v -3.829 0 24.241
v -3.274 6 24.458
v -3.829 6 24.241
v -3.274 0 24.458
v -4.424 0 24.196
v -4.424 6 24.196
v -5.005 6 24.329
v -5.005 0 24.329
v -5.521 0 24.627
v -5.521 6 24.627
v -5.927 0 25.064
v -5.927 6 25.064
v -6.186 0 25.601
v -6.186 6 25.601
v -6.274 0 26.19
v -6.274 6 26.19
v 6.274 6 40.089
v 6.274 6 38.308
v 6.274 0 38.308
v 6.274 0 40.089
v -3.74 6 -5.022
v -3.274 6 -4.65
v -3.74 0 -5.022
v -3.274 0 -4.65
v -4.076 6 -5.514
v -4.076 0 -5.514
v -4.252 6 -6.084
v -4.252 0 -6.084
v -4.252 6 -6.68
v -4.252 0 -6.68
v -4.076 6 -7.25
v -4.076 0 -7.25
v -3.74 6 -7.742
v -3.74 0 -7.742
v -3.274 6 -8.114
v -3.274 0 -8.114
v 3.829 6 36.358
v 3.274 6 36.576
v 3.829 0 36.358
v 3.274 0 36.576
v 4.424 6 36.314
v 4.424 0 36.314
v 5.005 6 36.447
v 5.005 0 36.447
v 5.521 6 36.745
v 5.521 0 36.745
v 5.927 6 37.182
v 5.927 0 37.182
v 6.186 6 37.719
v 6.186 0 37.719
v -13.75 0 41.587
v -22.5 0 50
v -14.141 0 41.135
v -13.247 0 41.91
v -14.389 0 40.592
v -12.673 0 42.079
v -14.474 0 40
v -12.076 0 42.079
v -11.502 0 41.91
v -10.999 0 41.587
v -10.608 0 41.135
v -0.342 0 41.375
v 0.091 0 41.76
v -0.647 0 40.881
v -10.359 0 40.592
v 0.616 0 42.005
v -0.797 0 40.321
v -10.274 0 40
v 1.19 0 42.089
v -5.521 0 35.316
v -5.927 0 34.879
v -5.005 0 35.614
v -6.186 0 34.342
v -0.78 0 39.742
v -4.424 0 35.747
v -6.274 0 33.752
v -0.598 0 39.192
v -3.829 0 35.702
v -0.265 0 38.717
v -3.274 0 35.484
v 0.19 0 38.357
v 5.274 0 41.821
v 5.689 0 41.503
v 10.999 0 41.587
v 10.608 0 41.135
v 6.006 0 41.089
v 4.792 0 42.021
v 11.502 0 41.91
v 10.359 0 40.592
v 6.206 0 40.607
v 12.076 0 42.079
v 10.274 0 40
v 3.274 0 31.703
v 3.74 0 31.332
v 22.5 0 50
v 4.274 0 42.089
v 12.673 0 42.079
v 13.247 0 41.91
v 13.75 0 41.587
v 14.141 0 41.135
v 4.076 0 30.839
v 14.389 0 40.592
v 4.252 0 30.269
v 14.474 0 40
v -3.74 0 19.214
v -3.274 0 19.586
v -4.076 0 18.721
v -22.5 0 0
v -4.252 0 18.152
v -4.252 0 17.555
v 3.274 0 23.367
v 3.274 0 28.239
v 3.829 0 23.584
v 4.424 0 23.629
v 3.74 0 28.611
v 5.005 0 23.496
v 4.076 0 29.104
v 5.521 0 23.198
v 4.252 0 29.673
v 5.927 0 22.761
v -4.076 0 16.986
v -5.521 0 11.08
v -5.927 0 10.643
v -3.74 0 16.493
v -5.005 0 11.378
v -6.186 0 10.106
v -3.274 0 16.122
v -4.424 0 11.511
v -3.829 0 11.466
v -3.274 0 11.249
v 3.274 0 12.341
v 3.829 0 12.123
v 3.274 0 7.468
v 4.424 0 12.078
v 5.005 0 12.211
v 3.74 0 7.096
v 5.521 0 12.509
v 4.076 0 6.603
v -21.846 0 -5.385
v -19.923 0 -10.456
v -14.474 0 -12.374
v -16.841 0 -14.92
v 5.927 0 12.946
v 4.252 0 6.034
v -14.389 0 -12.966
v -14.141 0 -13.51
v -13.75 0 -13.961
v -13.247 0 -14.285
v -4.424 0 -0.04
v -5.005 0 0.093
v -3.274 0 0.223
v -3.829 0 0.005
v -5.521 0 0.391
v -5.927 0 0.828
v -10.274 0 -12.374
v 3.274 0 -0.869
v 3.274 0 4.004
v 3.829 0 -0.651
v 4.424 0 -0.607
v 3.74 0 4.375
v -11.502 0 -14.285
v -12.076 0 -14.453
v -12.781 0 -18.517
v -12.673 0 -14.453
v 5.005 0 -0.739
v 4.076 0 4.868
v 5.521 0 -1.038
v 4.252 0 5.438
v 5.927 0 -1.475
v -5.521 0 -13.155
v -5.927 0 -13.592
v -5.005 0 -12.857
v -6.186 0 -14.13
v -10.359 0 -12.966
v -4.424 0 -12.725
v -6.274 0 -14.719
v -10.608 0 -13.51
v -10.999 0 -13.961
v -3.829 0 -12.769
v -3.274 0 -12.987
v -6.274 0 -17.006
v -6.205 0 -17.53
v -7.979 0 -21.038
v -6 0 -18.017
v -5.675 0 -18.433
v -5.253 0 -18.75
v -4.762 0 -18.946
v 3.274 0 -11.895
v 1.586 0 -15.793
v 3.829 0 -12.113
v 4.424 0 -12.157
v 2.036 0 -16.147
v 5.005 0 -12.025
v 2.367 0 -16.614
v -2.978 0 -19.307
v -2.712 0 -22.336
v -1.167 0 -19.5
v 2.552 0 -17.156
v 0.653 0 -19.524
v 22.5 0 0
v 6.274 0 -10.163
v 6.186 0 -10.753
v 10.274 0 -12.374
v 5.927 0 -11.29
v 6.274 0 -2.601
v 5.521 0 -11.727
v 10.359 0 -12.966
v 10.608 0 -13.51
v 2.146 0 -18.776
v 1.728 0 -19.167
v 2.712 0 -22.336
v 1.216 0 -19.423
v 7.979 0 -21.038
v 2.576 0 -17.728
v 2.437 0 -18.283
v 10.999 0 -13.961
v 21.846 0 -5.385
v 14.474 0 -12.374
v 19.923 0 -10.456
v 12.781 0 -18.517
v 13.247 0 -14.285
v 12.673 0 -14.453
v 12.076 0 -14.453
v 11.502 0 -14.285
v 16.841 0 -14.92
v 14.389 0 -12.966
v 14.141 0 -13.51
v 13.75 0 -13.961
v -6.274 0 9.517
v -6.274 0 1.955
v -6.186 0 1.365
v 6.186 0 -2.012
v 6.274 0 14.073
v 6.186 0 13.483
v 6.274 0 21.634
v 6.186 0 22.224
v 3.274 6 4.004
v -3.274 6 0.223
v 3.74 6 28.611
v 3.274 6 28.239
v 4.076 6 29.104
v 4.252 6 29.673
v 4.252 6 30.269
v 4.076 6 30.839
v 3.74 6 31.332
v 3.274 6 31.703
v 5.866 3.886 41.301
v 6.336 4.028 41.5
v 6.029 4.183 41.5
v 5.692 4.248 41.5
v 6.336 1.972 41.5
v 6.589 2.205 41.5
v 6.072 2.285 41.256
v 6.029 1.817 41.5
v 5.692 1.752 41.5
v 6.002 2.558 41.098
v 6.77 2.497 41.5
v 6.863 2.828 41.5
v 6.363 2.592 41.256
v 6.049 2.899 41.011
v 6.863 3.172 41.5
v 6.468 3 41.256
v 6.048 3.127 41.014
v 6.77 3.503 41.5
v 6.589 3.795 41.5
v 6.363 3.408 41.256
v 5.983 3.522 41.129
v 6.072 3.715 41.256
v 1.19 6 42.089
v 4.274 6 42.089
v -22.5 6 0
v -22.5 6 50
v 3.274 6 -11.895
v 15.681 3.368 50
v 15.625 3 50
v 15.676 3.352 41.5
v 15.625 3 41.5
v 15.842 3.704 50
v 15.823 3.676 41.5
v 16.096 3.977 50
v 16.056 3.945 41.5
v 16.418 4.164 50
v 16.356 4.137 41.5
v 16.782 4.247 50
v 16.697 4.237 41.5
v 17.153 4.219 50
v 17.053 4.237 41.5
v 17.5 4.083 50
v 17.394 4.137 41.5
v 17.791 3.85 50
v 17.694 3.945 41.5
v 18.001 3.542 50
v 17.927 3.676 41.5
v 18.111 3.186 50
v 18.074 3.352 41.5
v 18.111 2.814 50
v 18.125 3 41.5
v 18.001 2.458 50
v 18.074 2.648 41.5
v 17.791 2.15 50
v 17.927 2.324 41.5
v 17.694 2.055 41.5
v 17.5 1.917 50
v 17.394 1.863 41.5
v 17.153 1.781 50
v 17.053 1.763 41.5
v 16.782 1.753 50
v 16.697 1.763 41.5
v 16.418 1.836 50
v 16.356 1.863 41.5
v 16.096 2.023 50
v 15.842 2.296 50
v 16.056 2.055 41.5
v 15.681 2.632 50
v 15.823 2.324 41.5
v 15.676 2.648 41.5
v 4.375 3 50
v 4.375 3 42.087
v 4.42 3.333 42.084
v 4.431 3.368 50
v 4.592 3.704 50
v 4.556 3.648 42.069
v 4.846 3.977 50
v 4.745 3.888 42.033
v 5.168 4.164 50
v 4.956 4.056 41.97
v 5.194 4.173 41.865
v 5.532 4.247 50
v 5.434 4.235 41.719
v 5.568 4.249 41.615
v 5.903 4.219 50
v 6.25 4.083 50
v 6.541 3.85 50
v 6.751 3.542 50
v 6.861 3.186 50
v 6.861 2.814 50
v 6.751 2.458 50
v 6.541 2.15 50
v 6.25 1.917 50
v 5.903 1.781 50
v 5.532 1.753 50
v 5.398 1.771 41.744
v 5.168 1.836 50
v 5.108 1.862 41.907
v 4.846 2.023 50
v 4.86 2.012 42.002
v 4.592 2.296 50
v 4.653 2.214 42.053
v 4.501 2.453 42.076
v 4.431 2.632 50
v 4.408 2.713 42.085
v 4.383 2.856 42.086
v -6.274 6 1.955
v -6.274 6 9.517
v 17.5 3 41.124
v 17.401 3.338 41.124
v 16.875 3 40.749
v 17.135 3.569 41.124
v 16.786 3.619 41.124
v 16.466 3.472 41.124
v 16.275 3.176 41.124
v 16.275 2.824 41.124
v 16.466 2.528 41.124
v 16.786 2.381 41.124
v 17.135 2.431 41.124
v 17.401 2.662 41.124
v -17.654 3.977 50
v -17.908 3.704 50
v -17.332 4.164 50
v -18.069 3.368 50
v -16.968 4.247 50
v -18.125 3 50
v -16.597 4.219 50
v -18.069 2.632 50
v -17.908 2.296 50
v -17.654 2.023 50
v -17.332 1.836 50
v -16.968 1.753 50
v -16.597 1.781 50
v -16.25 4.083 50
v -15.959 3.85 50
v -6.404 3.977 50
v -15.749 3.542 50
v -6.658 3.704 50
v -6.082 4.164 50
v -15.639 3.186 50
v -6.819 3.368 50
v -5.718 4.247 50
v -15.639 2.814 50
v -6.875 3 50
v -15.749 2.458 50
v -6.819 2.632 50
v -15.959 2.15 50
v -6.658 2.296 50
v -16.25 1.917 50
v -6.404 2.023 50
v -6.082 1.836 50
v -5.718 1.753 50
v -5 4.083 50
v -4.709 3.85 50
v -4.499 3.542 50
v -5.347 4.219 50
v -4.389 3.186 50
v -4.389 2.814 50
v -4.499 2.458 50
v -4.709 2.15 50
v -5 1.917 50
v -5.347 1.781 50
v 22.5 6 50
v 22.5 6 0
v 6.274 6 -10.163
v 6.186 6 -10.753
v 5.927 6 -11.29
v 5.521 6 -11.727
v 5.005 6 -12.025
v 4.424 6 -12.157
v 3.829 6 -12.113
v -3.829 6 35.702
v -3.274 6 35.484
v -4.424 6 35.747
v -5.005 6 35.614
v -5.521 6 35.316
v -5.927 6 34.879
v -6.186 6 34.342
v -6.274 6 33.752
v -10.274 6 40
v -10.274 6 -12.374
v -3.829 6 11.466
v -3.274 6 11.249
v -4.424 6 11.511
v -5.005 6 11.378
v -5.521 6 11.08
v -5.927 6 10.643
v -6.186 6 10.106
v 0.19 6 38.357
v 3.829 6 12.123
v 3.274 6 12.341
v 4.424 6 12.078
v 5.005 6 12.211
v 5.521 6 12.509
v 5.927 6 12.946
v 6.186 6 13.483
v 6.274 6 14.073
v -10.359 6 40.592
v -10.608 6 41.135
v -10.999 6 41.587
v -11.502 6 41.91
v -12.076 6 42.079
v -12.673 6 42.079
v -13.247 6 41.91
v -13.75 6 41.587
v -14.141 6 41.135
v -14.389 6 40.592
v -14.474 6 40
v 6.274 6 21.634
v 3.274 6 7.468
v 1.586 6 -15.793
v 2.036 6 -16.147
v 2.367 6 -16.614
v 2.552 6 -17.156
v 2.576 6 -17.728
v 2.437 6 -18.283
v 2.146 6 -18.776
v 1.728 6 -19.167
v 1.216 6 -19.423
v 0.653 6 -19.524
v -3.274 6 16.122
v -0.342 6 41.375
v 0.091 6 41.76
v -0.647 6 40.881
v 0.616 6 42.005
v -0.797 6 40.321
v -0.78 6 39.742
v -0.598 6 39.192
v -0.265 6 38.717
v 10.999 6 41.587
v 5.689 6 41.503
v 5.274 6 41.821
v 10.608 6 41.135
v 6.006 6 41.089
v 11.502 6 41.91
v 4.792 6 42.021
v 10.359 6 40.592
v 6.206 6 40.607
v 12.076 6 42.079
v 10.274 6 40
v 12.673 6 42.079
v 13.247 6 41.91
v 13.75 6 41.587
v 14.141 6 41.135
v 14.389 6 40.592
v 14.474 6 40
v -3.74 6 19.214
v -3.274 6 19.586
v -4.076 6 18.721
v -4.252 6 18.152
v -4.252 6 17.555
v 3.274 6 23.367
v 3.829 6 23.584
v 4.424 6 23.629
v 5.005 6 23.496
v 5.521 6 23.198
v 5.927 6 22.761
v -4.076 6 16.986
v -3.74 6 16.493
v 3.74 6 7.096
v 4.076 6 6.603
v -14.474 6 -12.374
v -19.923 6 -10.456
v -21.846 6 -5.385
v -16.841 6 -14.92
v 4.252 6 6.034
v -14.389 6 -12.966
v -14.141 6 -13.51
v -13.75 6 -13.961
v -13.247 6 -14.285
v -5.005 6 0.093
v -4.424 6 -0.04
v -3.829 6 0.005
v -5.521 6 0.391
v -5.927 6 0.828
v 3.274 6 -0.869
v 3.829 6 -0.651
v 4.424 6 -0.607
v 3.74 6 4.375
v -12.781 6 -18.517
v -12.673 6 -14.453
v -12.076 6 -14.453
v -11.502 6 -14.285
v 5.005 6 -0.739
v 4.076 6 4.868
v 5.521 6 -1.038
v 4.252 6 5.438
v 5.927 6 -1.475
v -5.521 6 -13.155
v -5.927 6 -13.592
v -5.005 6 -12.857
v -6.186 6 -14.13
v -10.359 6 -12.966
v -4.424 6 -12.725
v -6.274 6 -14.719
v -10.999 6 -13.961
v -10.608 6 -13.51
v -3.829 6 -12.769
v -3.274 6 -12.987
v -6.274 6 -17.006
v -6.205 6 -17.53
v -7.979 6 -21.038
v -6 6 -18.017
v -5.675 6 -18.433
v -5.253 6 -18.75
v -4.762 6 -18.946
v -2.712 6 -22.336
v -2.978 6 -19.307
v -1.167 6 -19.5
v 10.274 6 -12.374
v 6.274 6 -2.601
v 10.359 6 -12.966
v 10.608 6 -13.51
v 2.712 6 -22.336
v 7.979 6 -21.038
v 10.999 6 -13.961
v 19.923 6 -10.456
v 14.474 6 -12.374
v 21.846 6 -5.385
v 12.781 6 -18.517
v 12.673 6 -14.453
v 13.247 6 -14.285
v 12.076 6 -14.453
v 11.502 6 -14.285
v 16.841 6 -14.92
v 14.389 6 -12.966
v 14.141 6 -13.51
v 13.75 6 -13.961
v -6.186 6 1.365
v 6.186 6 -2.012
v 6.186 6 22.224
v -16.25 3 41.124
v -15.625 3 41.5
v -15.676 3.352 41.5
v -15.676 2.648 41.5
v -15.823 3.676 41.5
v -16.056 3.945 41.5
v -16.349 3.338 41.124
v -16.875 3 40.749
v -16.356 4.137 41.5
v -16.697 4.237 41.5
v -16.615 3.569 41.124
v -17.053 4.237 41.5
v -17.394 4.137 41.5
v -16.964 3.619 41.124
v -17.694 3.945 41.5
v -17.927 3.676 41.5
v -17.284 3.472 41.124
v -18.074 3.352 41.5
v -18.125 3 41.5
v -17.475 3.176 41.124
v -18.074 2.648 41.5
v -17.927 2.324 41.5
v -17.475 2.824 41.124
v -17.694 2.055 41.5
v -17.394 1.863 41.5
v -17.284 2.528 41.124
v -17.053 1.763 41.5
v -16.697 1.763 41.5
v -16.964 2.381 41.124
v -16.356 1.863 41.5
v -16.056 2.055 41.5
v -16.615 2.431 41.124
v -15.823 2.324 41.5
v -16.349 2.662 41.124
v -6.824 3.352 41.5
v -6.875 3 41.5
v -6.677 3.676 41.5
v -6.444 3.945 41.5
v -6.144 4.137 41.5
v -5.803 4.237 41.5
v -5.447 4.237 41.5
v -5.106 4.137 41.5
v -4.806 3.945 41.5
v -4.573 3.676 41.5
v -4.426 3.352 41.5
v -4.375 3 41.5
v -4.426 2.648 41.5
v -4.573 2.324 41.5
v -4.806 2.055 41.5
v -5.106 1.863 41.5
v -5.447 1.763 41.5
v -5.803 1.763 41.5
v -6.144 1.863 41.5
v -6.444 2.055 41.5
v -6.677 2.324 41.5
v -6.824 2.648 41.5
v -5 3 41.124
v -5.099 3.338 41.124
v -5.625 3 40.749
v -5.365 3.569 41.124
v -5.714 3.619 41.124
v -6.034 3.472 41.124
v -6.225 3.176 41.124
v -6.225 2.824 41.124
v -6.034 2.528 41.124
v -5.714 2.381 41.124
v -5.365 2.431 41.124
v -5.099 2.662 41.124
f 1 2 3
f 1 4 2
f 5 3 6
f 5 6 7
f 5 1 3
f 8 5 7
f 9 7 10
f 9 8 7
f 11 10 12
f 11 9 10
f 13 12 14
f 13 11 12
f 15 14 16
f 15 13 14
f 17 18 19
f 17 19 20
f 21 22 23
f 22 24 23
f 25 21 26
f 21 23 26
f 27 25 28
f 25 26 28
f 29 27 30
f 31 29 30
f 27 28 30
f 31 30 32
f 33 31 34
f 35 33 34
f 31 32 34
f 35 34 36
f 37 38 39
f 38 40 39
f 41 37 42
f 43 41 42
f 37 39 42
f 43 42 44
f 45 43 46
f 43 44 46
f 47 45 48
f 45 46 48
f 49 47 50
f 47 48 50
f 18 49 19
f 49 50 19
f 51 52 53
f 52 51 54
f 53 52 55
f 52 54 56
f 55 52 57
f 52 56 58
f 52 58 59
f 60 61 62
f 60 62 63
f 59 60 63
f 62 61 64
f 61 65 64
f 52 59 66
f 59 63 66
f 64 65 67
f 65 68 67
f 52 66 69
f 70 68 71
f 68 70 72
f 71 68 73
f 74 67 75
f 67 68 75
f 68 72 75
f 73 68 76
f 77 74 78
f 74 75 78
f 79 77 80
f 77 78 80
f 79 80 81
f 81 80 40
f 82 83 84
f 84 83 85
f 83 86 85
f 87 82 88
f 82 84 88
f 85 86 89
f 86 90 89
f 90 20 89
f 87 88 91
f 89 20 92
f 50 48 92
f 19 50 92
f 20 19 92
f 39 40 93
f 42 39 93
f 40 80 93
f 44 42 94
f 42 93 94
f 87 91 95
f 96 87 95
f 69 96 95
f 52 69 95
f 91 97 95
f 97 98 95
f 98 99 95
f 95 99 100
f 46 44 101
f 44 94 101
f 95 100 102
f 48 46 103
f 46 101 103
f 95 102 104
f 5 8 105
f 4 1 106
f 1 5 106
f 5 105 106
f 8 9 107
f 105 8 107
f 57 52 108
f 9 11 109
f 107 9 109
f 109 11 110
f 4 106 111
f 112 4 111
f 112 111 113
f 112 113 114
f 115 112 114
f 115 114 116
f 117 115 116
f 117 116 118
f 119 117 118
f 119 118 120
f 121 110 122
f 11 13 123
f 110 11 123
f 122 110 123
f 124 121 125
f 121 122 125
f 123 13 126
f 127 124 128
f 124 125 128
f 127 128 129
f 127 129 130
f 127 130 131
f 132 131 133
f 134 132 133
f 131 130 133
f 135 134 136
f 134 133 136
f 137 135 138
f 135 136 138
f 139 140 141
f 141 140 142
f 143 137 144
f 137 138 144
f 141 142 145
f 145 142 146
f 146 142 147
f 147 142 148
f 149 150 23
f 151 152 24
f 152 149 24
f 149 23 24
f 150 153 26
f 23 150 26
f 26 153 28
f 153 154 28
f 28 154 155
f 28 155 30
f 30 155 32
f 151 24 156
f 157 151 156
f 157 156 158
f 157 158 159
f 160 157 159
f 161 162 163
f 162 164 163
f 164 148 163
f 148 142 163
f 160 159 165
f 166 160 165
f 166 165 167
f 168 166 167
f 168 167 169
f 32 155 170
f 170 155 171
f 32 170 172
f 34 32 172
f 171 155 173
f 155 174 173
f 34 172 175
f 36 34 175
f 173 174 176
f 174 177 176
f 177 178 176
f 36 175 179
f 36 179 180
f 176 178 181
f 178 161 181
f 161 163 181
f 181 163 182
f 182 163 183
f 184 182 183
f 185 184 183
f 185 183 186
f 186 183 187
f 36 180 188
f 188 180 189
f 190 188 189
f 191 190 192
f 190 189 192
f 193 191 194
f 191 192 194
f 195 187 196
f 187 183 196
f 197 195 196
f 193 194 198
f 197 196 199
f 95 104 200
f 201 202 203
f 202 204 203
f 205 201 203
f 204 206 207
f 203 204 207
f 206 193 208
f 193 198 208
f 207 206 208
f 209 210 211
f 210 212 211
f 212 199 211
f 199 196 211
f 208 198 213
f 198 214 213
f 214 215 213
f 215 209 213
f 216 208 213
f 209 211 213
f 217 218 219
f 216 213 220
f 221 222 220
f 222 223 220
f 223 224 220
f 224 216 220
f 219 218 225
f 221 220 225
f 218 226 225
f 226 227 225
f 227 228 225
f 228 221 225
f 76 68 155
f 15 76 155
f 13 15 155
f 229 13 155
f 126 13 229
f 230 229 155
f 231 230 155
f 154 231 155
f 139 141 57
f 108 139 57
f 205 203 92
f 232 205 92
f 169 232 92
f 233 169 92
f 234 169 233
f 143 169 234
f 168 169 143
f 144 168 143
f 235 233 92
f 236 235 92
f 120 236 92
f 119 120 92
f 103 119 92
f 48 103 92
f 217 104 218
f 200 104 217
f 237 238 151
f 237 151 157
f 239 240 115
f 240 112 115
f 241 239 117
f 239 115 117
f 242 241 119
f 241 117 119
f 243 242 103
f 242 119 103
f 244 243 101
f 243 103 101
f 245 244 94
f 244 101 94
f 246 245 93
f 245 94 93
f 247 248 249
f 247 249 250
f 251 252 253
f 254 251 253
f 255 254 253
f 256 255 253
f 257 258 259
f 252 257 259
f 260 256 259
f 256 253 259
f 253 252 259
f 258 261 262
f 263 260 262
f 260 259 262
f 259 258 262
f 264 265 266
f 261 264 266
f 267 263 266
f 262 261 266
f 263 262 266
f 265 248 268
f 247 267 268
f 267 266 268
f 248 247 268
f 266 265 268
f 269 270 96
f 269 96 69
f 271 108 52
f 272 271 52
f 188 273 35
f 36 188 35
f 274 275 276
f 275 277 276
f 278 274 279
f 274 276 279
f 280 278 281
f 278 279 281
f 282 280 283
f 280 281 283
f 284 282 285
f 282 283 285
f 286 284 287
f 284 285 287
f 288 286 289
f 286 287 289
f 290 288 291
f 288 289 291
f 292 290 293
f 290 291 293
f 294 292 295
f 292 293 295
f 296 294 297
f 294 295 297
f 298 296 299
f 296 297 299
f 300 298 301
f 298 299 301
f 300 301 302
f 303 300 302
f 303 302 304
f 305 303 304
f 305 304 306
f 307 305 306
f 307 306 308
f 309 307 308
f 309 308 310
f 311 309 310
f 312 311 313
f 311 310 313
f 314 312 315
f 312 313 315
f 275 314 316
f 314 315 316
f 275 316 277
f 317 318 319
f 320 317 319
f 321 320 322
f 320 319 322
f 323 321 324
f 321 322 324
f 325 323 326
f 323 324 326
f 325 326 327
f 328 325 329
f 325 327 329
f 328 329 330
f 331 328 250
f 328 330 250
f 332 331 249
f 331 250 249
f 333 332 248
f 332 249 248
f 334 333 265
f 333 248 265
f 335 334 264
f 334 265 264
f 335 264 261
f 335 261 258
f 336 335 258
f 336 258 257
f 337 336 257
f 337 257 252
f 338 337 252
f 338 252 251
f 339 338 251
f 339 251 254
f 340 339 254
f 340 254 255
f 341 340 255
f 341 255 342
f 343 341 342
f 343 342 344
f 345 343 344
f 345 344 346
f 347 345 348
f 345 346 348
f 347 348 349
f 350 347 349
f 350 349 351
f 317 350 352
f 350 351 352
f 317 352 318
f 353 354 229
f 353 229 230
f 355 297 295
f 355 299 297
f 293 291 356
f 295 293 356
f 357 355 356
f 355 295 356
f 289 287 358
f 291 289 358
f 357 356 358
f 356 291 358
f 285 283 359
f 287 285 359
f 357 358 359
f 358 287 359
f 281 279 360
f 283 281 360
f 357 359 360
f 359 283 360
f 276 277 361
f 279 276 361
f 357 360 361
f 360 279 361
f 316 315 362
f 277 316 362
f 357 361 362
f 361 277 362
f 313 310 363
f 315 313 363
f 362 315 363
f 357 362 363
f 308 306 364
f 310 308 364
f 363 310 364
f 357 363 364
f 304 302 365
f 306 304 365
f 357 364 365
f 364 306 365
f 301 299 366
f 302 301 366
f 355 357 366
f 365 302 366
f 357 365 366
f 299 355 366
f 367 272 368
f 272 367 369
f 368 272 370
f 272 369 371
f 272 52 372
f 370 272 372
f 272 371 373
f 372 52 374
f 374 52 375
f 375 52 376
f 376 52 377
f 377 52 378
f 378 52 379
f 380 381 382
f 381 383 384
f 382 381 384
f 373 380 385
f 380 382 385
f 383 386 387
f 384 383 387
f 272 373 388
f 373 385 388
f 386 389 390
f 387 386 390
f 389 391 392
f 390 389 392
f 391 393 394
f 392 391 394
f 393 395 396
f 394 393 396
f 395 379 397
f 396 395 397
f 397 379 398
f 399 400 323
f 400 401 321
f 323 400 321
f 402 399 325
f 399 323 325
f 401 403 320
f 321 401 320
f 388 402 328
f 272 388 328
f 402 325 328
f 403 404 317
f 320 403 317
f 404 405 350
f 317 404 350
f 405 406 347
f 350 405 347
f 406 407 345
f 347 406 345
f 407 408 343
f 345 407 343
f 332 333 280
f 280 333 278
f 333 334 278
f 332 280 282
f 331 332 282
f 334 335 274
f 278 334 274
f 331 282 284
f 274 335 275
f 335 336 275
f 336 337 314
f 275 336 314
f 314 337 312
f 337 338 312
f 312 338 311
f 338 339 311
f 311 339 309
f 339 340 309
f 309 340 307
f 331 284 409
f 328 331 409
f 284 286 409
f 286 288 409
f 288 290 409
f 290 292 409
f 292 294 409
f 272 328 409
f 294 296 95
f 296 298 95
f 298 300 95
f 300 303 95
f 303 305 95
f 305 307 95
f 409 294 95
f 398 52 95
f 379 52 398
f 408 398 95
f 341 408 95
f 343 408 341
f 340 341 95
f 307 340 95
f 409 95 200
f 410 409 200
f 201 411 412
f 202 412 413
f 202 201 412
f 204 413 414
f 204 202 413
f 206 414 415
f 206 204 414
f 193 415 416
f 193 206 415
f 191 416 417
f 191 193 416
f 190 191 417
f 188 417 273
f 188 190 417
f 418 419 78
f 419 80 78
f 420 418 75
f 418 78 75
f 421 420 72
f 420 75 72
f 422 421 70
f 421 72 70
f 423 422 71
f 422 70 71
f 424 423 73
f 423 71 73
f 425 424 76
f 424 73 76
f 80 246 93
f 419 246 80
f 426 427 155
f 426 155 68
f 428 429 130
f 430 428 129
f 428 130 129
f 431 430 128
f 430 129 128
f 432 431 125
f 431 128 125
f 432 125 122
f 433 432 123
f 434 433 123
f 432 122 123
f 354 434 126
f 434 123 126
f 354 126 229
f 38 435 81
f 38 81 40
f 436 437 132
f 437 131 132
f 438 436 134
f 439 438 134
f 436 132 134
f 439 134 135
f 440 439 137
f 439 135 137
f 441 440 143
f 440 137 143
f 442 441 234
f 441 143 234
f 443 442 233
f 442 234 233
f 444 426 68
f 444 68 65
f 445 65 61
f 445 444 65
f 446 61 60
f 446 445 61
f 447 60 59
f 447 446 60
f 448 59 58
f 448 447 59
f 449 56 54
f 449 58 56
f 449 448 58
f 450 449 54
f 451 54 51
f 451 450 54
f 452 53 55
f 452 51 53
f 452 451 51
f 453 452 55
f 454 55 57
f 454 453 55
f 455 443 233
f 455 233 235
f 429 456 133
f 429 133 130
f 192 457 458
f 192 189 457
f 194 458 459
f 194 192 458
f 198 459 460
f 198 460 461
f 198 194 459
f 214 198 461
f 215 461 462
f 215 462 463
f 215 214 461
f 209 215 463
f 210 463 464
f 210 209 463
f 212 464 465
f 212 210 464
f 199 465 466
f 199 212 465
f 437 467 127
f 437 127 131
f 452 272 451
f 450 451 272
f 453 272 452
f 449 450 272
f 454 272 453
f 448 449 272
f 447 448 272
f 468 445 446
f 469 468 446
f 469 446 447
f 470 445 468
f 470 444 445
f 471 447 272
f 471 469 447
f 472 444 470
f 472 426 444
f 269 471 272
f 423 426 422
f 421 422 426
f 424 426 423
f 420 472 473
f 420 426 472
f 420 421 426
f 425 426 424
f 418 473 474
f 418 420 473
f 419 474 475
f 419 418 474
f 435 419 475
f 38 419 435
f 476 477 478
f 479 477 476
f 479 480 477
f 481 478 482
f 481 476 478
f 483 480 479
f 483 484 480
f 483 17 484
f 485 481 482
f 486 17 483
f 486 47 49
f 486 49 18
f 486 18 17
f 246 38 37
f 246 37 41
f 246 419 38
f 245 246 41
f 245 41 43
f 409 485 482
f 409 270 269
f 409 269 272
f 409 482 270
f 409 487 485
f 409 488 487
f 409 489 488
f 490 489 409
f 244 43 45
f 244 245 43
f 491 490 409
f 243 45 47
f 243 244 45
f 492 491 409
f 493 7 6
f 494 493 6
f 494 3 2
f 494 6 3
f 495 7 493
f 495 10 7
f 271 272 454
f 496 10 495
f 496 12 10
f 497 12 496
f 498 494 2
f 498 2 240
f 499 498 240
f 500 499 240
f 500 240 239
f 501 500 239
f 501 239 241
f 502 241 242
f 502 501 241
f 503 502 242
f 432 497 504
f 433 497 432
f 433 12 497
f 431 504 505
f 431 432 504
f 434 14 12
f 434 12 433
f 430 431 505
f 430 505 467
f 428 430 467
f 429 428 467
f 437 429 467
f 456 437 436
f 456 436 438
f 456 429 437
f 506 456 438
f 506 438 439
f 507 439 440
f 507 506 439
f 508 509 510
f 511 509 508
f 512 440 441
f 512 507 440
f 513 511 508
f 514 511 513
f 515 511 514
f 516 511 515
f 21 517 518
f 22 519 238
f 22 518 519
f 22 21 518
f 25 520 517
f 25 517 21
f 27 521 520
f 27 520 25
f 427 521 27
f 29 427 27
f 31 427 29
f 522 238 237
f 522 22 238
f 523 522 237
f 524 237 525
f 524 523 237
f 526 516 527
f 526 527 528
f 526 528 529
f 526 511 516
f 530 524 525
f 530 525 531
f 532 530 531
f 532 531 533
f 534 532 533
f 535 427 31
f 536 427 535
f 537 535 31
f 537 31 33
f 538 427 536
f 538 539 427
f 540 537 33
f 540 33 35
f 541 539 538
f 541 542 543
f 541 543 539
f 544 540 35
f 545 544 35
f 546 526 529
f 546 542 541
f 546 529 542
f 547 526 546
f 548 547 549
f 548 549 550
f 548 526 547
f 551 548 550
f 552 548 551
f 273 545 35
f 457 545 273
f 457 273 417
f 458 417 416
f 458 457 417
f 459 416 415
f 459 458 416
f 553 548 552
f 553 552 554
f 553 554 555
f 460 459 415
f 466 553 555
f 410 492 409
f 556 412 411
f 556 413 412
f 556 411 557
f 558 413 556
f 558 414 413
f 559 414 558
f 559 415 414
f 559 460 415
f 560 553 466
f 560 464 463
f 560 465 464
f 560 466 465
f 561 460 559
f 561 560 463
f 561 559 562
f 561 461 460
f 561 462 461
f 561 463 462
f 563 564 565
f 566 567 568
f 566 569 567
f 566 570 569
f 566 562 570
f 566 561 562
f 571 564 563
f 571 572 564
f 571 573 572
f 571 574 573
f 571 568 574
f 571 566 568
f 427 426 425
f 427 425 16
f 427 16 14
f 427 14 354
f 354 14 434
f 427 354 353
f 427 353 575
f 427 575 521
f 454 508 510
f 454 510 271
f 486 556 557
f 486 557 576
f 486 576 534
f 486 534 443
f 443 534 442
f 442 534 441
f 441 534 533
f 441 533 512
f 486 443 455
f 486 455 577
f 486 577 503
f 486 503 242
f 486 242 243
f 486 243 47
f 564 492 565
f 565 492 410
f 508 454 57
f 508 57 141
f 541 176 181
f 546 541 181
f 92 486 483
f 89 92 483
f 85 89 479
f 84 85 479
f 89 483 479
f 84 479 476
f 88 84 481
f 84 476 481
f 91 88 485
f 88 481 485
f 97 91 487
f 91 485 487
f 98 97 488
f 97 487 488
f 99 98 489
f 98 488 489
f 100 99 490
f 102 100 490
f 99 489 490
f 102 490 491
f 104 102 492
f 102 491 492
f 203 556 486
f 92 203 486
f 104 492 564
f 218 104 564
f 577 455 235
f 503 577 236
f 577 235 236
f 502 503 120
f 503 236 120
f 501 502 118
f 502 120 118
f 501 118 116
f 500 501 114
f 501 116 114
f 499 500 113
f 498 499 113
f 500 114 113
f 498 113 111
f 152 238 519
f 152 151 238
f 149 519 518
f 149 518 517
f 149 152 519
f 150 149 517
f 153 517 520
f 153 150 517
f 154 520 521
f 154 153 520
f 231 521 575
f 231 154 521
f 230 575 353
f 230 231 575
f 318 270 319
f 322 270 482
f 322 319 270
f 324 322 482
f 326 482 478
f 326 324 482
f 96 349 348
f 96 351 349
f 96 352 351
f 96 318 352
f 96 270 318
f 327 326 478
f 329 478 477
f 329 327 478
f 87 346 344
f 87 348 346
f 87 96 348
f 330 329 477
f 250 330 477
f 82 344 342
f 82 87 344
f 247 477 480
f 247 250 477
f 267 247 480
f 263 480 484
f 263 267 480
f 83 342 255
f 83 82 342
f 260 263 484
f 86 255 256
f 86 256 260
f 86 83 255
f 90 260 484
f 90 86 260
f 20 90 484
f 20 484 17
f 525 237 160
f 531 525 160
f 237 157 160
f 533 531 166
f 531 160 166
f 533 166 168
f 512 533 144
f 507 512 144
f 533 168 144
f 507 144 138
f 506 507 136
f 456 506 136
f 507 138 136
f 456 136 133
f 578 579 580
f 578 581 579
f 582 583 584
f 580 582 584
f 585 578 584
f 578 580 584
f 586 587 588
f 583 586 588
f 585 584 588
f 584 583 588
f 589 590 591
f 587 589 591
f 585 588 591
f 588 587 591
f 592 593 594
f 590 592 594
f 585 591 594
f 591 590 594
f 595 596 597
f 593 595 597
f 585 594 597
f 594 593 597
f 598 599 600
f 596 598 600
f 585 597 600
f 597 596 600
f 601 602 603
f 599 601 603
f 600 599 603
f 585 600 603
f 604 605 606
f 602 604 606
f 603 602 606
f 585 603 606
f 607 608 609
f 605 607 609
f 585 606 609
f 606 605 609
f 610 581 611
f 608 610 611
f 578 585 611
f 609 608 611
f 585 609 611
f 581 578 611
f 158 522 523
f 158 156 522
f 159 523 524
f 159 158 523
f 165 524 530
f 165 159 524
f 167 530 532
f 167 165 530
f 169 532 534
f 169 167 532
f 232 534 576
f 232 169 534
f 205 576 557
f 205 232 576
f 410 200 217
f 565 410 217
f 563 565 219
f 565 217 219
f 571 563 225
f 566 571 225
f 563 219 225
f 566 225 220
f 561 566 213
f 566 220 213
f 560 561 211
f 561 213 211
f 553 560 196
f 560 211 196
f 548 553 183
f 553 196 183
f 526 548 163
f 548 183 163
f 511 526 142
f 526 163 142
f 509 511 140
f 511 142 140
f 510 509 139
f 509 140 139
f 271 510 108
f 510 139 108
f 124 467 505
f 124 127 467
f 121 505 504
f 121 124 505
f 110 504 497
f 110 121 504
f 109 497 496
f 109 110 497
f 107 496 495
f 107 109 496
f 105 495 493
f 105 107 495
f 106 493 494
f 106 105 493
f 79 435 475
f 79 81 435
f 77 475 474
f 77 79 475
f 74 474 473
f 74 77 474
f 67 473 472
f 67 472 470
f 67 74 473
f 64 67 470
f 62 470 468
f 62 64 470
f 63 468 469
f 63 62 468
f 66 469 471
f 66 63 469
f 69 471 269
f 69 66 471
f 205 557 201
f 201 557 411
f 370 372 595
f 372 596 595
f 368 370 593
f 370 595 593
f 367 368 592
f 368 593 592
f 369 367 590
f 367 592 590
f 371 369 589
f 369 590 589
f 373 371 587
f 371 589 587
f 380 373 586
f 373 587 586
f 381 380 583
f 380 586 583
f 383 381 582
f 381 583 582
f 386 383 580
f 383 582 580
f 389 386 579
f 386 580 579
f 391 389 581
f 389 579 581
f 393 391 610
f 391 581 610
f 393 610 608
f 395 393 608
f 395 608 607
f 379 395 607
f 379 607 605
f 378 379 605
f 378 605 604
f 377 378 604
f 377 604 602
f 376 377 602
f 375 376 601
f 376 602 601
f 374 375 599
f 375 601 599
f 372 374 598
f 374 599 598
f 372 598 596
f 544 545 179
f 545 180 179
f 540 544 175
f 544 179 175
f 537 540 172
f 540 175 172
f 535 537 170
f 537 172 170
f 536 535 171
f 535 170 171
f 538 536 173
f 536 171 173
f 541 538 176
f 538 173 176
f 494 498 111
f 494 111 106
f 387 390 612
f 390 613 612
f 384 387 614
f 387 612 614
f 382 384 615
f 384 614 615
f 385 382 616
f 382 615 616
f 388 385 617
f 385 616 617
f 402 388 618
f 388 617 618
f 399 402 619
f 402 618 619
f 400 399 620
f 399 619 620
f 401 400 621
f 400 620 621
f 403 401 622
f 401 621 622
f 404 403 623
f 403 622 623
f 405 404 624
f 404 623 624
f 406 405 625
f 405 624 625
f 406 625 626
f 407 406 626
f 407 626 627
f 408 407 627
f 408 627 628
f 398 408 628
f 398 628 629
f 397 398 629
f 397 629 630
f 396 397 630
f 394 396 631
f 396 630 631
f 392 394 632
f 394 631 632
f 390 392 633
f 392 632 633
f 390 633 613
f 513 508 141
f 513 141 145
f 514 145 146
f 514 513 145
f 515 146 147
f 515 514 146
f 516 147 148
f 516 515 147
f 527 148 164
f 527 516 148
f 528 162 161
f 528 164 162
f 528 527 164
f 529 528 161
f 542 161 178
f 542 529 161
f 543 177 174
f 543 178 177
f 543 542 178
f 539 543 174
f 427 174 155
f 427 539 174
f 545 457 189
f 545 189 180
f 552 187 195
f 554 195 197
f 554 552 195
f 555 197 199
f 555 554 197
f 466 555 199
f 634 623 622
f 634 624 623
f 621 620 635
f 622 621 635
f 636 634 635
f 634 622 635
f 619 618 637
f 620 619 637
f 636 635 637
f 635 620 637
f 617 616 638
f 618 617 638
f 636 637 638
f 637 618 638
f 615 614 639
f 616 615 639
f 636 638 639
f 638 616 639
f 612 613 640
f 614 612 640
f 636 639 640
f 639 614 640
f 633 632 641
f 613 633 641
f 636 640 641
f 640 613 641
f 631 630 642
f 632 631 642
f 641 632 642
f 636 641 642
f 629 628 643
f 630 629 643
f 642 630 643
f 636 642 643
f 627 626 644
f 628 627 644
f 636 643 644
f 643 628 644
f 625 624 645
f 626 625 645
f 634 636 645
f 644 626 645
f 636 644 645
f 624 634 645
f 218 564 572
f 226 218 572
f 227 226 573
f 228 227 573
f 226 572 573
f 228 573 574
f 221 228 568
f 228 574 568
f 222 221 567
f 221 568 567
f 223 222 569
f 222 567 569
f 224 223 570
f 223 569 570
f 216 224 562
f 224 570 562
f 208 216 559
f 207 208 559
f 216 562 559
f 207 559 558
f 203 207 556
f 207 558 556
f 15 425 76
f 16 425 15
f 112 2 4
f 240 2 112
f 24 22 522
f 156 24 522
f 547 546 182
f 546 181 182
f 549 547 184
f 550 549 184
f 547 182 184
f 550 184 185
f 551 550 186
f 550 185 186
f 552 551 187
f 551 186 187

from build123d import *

# Parameters (mm, degrees)
EXTRUDE_1_DEPTH     = 6
CUT_EXTRUDE_1_DEPTH = 56.156595254
CUT_EXTRUDE_2_REACH = 57.157
FILLET_18_R         = 2
M3X0_51_D           = 2.5
M3X0_51_DEPTH       = 8.5
M3X0_51_TIP         = 0.751075774


with BuildPart() as part:
    # Эскиз1 → Бобышка-Вытянуть1 (new body)
    with BuildSketch(Plane(origin=(0, 0, 0), x_dir=(1, 0, 0), z_dir=(0, 1, 0))):
        with BuildLine():
            Line((-22.5, 0), (-22.5, -50))
            Line((-22.5, -50), (22.5, -50))
            Line((22.5, -50), (22.5, 0))
            ThreePointArc((22.5, 0), (0, 22.5), (-22.5, 0))
        make_face()
    extrude(amount=EXTRUDE_1_DEPTH)

    # Эскиз2 → Вырез-Вытянуть1 (cut, through all)
    with BuildSketch(Plane(origin=(0, 6, 0), x_dir=(1, 0, 0), z_dir=(0, 1, 0))):
        with BuildLine():
            Line((-10.274368671, 12.374368671), (-10.274368671, -40))
            ThreePointArc((-10.274368671, -40), (-12.374368671, -42.1), (-14.474368671, -40))
            Line((-14.474368671, -40), (-14.474368671, 12.374368671))
            ThreePointArc((-14.474368671, 12.374368671), (-12.374368671, 14.474368671), (-10.274368671, 12.374368671))
        make_face()
        with BuildLine():
            Line((10.274368671, 12.374368671), (10.274368671, -40))
            ThreePointArc((10.274368671, -40), (12.374368671, -42.1), (14.474368671, -40))
            Line((14.474368671, -40), (14.474368671, 12.374368671))
            ThreePointArc((14.474368671, 12.374368671), (12.374368671, 14.474368671), (10.274368671, 12.374368671))
        make_face()
    extrude(amount=-CUT_EXTRUDE_1_DEPTH, mode=Mode.SUBTRACT)

    # Эскиз11 → Вырез-Вытянуть2 (cut, up to next)
    with BuildSketch(Plane(origin=(0, 6, 0), x_dir=(1, 0, 0), z_dir=(0, 1, 0)), mode=Mode.PRIVATE) as cut_extrude_2_sk1:
        with BuildLine():
            Line((6.274368671, 18.5), (-6.274368671, 11.254983118))
            Line((-6.274368671, 11.254983118), (-6.274368671, 18.5))
            ThreePointArc((-6.274368671, 18.5), (0, 19.535037809), (6.274368671, 18.5))
        make_face()
    cut_extrude_2_tool1 = extrude(cut_extrude_2_sk1.sketch, amount=-CUT_EXTRUDE_2_REACH, mode=Mode.PRIVATE) & part.part
    # Эскиз11 → Вырез-Вытянуть2 (cut, up to next)
    with BuildSketch(Plane(origin=(0, 6, 0), x_dir=(1, 0, 0), z_dir=(0, 1, 0)), mode=Mode.PRIVATE) as cut_extrude_2_sk2:
        Polygon((6.274368671, 13.627163728), (-6.274368671, 6.382146846), (6.274368671, -0.862870036), align=None)
    cut_extrude_2_tool2 = extrude(cut_extrude_2_sk2.sketch, amount=-CUT_EXTRUDE_2_REACH, mode=Mode.PRIVATE) & part.part
    # Эскиз11 → Вырез-Вытянуть2 (cut, up to next)
    with BuildSketch(Plane(origin=(0, 6, 0), x_dir=(1, 0, 0), z_dir=(0, 1, 0)), mode=Mode.PRIVATE) as cut_extrude_2_sk3:
        Polygon((-6.274368671, 1.509310574), (6.274368671, -5.735706308), (-6.274368671, -12.98072319), align=None)
    cut_extrude_2_tool3 = extrude(cut_extrude_2_sk3.sketch, amount=-CUT_EXTRUDE_2_REACH, mode=Mode.PRIVATE) & part.part
    # Эскиз11 → Вырез-Вытянуть2 (cut, up to next)
    with BuildSketch(Plane(origin=(0, 6, 0), x_dir=(1, 0, 0), z_dir=(0, 1, 0)), mode=Mode.PRIVATE) as cut_extrude_2_sk4:
        Polygon((-6.274368671, -17.853559462), (6.274368671, -10.60854258), (6.274368671, -25.098576344), align=None)
    cut_extrude_2_tool4 = extrude(cut_extrude_2_sk4.sketch, amount=-CUT_EXTRUDE_2_REACH, mode=Mode.PRIVATE) & part.part
    # Эскиз11 → Вырез-Вытянуть2 (cut, up to next)
    with BuildSketch(Plane(origin=(0, 6, 0), x_dir=(1, 0, 0), z_dir=(0, 1, 0)), mode=Mode.PRIVATE) as cut_extrude_2_sk5:
        Polygon((-6.274368671, -22.726395734), (6.274368671, -29.971412616), (-6.274368671, -37.216429498), align=None)
    cut_extrude_2_tool5 = extrude(cut_extrude_2_sk5.sketch, amount=-CUT_EXTRUDE_2_REACH, mode=Mode.PRIVATE) & part.part
    # Эскиз11 → Вырез-Вытянуть2 (cut, up to next)
    with BuildSketch(Plane(origin=(0, 6, 0), x_dir=(1, 0, 0), z_dir=(0, 1, 0)), mode=Mode.PRIVATE) as cut_extrude_2_sk6:
        Polygon((-6.274368671, -42.08926577), (6.274368671, -34.844248888), (6.274368671, -42.08926577), align=None)
    cut_extrude_2_tool6 = extrude(cut_extrude_2_sk6.sketch, amount=-CUT_EXTRUDE_2_REACH, mode=Mode.PRIVATE) & part.part
    add(cut_extrude_2_tool1.solids().sort_by_distance((-1.755291, 6, -16.539864))[0], mode=Mode.SUBTRACT)
    add(cut_extrude_2_tool2.solids().sort_by_distance((2.091456, 6, -6.382147))[0], mode=Mode.SUBTRACT)
    add(cut_extrude_2_tool3.solids().sort_by_distance((-2.091456, 6, 5.735706))[0], mode=Mode.SUBTRACT)
    add(cut_extrude_2_tool4.solids().sort_by_distance((2.091456, 6, 17.853559))[0], mode=Mode.SUBTRACT)
    add(cut_extrude_2_tool5.solids().sort_by_distance((-2.091456, 6, 29.971413))[0], mode=Mode.SUBTRACT)
    add(cut_extrude_2_tool6.solids().sort_by_distance((2.091456, 6, 39.67426))[0], mode=Mode.SUBTRACT)

    # Скругление18
    fillet_18_edges = [part.edges().sort_by_distance(p)[0] for p in [
        (6.274368671, 3, -13.627163728),
        (6.274368671, 3, 0.862870036),
        (-6.274368671, 3, -6.382146846),
        (-6.274368671, 3, -18.5),
        (6.274368671, 3, -18.5),
        (-6.274368671, 3, -11.254983118),
        (-6.274368671, 3, 12.98072319),
        (-6.274368671, 3, -1.509310574),
        (6.274368671, 3, 5.735706308),
        (6.274368671, 3, 25.098576344),
        (-6.274368671, 3, 17.853559462),
        (6.274368671, 3, 10.60854258),
        (-6.274368671, 3, 37.216429498),
        (-6.274368671, 3, 22.726395734),
        (6.274368671, 3, 29.971412616),
        (6.274368671, 3, 42.08926577),
        (-6.274368671, 3, 42.08926577),
        (6.274368671, 3, 34.844248888),
    ]]
    fillet(fillet_18_edges, radius=FILLET_18_R)

    # Отверстие обработанное метчиком M3x0.51
    with Locations(Plane.XY.offset(50)):
        with Locations((-16.875, 3), (-5.625, 3), (5.625, 3), (16.875, 3)):
            Hole(M3X0_51_D / 2, depth=M3X0_51_DEPTH)
            with Locations((0, 0, -(M3X0_51_DEPTH + M3X0_51_TIP / 2))):  # 118° drill point
                Cone(0, M3X0_51_D / 2, M3X0_51_TIP, mode=Mode.SUBTRACT)


solid = part.part
